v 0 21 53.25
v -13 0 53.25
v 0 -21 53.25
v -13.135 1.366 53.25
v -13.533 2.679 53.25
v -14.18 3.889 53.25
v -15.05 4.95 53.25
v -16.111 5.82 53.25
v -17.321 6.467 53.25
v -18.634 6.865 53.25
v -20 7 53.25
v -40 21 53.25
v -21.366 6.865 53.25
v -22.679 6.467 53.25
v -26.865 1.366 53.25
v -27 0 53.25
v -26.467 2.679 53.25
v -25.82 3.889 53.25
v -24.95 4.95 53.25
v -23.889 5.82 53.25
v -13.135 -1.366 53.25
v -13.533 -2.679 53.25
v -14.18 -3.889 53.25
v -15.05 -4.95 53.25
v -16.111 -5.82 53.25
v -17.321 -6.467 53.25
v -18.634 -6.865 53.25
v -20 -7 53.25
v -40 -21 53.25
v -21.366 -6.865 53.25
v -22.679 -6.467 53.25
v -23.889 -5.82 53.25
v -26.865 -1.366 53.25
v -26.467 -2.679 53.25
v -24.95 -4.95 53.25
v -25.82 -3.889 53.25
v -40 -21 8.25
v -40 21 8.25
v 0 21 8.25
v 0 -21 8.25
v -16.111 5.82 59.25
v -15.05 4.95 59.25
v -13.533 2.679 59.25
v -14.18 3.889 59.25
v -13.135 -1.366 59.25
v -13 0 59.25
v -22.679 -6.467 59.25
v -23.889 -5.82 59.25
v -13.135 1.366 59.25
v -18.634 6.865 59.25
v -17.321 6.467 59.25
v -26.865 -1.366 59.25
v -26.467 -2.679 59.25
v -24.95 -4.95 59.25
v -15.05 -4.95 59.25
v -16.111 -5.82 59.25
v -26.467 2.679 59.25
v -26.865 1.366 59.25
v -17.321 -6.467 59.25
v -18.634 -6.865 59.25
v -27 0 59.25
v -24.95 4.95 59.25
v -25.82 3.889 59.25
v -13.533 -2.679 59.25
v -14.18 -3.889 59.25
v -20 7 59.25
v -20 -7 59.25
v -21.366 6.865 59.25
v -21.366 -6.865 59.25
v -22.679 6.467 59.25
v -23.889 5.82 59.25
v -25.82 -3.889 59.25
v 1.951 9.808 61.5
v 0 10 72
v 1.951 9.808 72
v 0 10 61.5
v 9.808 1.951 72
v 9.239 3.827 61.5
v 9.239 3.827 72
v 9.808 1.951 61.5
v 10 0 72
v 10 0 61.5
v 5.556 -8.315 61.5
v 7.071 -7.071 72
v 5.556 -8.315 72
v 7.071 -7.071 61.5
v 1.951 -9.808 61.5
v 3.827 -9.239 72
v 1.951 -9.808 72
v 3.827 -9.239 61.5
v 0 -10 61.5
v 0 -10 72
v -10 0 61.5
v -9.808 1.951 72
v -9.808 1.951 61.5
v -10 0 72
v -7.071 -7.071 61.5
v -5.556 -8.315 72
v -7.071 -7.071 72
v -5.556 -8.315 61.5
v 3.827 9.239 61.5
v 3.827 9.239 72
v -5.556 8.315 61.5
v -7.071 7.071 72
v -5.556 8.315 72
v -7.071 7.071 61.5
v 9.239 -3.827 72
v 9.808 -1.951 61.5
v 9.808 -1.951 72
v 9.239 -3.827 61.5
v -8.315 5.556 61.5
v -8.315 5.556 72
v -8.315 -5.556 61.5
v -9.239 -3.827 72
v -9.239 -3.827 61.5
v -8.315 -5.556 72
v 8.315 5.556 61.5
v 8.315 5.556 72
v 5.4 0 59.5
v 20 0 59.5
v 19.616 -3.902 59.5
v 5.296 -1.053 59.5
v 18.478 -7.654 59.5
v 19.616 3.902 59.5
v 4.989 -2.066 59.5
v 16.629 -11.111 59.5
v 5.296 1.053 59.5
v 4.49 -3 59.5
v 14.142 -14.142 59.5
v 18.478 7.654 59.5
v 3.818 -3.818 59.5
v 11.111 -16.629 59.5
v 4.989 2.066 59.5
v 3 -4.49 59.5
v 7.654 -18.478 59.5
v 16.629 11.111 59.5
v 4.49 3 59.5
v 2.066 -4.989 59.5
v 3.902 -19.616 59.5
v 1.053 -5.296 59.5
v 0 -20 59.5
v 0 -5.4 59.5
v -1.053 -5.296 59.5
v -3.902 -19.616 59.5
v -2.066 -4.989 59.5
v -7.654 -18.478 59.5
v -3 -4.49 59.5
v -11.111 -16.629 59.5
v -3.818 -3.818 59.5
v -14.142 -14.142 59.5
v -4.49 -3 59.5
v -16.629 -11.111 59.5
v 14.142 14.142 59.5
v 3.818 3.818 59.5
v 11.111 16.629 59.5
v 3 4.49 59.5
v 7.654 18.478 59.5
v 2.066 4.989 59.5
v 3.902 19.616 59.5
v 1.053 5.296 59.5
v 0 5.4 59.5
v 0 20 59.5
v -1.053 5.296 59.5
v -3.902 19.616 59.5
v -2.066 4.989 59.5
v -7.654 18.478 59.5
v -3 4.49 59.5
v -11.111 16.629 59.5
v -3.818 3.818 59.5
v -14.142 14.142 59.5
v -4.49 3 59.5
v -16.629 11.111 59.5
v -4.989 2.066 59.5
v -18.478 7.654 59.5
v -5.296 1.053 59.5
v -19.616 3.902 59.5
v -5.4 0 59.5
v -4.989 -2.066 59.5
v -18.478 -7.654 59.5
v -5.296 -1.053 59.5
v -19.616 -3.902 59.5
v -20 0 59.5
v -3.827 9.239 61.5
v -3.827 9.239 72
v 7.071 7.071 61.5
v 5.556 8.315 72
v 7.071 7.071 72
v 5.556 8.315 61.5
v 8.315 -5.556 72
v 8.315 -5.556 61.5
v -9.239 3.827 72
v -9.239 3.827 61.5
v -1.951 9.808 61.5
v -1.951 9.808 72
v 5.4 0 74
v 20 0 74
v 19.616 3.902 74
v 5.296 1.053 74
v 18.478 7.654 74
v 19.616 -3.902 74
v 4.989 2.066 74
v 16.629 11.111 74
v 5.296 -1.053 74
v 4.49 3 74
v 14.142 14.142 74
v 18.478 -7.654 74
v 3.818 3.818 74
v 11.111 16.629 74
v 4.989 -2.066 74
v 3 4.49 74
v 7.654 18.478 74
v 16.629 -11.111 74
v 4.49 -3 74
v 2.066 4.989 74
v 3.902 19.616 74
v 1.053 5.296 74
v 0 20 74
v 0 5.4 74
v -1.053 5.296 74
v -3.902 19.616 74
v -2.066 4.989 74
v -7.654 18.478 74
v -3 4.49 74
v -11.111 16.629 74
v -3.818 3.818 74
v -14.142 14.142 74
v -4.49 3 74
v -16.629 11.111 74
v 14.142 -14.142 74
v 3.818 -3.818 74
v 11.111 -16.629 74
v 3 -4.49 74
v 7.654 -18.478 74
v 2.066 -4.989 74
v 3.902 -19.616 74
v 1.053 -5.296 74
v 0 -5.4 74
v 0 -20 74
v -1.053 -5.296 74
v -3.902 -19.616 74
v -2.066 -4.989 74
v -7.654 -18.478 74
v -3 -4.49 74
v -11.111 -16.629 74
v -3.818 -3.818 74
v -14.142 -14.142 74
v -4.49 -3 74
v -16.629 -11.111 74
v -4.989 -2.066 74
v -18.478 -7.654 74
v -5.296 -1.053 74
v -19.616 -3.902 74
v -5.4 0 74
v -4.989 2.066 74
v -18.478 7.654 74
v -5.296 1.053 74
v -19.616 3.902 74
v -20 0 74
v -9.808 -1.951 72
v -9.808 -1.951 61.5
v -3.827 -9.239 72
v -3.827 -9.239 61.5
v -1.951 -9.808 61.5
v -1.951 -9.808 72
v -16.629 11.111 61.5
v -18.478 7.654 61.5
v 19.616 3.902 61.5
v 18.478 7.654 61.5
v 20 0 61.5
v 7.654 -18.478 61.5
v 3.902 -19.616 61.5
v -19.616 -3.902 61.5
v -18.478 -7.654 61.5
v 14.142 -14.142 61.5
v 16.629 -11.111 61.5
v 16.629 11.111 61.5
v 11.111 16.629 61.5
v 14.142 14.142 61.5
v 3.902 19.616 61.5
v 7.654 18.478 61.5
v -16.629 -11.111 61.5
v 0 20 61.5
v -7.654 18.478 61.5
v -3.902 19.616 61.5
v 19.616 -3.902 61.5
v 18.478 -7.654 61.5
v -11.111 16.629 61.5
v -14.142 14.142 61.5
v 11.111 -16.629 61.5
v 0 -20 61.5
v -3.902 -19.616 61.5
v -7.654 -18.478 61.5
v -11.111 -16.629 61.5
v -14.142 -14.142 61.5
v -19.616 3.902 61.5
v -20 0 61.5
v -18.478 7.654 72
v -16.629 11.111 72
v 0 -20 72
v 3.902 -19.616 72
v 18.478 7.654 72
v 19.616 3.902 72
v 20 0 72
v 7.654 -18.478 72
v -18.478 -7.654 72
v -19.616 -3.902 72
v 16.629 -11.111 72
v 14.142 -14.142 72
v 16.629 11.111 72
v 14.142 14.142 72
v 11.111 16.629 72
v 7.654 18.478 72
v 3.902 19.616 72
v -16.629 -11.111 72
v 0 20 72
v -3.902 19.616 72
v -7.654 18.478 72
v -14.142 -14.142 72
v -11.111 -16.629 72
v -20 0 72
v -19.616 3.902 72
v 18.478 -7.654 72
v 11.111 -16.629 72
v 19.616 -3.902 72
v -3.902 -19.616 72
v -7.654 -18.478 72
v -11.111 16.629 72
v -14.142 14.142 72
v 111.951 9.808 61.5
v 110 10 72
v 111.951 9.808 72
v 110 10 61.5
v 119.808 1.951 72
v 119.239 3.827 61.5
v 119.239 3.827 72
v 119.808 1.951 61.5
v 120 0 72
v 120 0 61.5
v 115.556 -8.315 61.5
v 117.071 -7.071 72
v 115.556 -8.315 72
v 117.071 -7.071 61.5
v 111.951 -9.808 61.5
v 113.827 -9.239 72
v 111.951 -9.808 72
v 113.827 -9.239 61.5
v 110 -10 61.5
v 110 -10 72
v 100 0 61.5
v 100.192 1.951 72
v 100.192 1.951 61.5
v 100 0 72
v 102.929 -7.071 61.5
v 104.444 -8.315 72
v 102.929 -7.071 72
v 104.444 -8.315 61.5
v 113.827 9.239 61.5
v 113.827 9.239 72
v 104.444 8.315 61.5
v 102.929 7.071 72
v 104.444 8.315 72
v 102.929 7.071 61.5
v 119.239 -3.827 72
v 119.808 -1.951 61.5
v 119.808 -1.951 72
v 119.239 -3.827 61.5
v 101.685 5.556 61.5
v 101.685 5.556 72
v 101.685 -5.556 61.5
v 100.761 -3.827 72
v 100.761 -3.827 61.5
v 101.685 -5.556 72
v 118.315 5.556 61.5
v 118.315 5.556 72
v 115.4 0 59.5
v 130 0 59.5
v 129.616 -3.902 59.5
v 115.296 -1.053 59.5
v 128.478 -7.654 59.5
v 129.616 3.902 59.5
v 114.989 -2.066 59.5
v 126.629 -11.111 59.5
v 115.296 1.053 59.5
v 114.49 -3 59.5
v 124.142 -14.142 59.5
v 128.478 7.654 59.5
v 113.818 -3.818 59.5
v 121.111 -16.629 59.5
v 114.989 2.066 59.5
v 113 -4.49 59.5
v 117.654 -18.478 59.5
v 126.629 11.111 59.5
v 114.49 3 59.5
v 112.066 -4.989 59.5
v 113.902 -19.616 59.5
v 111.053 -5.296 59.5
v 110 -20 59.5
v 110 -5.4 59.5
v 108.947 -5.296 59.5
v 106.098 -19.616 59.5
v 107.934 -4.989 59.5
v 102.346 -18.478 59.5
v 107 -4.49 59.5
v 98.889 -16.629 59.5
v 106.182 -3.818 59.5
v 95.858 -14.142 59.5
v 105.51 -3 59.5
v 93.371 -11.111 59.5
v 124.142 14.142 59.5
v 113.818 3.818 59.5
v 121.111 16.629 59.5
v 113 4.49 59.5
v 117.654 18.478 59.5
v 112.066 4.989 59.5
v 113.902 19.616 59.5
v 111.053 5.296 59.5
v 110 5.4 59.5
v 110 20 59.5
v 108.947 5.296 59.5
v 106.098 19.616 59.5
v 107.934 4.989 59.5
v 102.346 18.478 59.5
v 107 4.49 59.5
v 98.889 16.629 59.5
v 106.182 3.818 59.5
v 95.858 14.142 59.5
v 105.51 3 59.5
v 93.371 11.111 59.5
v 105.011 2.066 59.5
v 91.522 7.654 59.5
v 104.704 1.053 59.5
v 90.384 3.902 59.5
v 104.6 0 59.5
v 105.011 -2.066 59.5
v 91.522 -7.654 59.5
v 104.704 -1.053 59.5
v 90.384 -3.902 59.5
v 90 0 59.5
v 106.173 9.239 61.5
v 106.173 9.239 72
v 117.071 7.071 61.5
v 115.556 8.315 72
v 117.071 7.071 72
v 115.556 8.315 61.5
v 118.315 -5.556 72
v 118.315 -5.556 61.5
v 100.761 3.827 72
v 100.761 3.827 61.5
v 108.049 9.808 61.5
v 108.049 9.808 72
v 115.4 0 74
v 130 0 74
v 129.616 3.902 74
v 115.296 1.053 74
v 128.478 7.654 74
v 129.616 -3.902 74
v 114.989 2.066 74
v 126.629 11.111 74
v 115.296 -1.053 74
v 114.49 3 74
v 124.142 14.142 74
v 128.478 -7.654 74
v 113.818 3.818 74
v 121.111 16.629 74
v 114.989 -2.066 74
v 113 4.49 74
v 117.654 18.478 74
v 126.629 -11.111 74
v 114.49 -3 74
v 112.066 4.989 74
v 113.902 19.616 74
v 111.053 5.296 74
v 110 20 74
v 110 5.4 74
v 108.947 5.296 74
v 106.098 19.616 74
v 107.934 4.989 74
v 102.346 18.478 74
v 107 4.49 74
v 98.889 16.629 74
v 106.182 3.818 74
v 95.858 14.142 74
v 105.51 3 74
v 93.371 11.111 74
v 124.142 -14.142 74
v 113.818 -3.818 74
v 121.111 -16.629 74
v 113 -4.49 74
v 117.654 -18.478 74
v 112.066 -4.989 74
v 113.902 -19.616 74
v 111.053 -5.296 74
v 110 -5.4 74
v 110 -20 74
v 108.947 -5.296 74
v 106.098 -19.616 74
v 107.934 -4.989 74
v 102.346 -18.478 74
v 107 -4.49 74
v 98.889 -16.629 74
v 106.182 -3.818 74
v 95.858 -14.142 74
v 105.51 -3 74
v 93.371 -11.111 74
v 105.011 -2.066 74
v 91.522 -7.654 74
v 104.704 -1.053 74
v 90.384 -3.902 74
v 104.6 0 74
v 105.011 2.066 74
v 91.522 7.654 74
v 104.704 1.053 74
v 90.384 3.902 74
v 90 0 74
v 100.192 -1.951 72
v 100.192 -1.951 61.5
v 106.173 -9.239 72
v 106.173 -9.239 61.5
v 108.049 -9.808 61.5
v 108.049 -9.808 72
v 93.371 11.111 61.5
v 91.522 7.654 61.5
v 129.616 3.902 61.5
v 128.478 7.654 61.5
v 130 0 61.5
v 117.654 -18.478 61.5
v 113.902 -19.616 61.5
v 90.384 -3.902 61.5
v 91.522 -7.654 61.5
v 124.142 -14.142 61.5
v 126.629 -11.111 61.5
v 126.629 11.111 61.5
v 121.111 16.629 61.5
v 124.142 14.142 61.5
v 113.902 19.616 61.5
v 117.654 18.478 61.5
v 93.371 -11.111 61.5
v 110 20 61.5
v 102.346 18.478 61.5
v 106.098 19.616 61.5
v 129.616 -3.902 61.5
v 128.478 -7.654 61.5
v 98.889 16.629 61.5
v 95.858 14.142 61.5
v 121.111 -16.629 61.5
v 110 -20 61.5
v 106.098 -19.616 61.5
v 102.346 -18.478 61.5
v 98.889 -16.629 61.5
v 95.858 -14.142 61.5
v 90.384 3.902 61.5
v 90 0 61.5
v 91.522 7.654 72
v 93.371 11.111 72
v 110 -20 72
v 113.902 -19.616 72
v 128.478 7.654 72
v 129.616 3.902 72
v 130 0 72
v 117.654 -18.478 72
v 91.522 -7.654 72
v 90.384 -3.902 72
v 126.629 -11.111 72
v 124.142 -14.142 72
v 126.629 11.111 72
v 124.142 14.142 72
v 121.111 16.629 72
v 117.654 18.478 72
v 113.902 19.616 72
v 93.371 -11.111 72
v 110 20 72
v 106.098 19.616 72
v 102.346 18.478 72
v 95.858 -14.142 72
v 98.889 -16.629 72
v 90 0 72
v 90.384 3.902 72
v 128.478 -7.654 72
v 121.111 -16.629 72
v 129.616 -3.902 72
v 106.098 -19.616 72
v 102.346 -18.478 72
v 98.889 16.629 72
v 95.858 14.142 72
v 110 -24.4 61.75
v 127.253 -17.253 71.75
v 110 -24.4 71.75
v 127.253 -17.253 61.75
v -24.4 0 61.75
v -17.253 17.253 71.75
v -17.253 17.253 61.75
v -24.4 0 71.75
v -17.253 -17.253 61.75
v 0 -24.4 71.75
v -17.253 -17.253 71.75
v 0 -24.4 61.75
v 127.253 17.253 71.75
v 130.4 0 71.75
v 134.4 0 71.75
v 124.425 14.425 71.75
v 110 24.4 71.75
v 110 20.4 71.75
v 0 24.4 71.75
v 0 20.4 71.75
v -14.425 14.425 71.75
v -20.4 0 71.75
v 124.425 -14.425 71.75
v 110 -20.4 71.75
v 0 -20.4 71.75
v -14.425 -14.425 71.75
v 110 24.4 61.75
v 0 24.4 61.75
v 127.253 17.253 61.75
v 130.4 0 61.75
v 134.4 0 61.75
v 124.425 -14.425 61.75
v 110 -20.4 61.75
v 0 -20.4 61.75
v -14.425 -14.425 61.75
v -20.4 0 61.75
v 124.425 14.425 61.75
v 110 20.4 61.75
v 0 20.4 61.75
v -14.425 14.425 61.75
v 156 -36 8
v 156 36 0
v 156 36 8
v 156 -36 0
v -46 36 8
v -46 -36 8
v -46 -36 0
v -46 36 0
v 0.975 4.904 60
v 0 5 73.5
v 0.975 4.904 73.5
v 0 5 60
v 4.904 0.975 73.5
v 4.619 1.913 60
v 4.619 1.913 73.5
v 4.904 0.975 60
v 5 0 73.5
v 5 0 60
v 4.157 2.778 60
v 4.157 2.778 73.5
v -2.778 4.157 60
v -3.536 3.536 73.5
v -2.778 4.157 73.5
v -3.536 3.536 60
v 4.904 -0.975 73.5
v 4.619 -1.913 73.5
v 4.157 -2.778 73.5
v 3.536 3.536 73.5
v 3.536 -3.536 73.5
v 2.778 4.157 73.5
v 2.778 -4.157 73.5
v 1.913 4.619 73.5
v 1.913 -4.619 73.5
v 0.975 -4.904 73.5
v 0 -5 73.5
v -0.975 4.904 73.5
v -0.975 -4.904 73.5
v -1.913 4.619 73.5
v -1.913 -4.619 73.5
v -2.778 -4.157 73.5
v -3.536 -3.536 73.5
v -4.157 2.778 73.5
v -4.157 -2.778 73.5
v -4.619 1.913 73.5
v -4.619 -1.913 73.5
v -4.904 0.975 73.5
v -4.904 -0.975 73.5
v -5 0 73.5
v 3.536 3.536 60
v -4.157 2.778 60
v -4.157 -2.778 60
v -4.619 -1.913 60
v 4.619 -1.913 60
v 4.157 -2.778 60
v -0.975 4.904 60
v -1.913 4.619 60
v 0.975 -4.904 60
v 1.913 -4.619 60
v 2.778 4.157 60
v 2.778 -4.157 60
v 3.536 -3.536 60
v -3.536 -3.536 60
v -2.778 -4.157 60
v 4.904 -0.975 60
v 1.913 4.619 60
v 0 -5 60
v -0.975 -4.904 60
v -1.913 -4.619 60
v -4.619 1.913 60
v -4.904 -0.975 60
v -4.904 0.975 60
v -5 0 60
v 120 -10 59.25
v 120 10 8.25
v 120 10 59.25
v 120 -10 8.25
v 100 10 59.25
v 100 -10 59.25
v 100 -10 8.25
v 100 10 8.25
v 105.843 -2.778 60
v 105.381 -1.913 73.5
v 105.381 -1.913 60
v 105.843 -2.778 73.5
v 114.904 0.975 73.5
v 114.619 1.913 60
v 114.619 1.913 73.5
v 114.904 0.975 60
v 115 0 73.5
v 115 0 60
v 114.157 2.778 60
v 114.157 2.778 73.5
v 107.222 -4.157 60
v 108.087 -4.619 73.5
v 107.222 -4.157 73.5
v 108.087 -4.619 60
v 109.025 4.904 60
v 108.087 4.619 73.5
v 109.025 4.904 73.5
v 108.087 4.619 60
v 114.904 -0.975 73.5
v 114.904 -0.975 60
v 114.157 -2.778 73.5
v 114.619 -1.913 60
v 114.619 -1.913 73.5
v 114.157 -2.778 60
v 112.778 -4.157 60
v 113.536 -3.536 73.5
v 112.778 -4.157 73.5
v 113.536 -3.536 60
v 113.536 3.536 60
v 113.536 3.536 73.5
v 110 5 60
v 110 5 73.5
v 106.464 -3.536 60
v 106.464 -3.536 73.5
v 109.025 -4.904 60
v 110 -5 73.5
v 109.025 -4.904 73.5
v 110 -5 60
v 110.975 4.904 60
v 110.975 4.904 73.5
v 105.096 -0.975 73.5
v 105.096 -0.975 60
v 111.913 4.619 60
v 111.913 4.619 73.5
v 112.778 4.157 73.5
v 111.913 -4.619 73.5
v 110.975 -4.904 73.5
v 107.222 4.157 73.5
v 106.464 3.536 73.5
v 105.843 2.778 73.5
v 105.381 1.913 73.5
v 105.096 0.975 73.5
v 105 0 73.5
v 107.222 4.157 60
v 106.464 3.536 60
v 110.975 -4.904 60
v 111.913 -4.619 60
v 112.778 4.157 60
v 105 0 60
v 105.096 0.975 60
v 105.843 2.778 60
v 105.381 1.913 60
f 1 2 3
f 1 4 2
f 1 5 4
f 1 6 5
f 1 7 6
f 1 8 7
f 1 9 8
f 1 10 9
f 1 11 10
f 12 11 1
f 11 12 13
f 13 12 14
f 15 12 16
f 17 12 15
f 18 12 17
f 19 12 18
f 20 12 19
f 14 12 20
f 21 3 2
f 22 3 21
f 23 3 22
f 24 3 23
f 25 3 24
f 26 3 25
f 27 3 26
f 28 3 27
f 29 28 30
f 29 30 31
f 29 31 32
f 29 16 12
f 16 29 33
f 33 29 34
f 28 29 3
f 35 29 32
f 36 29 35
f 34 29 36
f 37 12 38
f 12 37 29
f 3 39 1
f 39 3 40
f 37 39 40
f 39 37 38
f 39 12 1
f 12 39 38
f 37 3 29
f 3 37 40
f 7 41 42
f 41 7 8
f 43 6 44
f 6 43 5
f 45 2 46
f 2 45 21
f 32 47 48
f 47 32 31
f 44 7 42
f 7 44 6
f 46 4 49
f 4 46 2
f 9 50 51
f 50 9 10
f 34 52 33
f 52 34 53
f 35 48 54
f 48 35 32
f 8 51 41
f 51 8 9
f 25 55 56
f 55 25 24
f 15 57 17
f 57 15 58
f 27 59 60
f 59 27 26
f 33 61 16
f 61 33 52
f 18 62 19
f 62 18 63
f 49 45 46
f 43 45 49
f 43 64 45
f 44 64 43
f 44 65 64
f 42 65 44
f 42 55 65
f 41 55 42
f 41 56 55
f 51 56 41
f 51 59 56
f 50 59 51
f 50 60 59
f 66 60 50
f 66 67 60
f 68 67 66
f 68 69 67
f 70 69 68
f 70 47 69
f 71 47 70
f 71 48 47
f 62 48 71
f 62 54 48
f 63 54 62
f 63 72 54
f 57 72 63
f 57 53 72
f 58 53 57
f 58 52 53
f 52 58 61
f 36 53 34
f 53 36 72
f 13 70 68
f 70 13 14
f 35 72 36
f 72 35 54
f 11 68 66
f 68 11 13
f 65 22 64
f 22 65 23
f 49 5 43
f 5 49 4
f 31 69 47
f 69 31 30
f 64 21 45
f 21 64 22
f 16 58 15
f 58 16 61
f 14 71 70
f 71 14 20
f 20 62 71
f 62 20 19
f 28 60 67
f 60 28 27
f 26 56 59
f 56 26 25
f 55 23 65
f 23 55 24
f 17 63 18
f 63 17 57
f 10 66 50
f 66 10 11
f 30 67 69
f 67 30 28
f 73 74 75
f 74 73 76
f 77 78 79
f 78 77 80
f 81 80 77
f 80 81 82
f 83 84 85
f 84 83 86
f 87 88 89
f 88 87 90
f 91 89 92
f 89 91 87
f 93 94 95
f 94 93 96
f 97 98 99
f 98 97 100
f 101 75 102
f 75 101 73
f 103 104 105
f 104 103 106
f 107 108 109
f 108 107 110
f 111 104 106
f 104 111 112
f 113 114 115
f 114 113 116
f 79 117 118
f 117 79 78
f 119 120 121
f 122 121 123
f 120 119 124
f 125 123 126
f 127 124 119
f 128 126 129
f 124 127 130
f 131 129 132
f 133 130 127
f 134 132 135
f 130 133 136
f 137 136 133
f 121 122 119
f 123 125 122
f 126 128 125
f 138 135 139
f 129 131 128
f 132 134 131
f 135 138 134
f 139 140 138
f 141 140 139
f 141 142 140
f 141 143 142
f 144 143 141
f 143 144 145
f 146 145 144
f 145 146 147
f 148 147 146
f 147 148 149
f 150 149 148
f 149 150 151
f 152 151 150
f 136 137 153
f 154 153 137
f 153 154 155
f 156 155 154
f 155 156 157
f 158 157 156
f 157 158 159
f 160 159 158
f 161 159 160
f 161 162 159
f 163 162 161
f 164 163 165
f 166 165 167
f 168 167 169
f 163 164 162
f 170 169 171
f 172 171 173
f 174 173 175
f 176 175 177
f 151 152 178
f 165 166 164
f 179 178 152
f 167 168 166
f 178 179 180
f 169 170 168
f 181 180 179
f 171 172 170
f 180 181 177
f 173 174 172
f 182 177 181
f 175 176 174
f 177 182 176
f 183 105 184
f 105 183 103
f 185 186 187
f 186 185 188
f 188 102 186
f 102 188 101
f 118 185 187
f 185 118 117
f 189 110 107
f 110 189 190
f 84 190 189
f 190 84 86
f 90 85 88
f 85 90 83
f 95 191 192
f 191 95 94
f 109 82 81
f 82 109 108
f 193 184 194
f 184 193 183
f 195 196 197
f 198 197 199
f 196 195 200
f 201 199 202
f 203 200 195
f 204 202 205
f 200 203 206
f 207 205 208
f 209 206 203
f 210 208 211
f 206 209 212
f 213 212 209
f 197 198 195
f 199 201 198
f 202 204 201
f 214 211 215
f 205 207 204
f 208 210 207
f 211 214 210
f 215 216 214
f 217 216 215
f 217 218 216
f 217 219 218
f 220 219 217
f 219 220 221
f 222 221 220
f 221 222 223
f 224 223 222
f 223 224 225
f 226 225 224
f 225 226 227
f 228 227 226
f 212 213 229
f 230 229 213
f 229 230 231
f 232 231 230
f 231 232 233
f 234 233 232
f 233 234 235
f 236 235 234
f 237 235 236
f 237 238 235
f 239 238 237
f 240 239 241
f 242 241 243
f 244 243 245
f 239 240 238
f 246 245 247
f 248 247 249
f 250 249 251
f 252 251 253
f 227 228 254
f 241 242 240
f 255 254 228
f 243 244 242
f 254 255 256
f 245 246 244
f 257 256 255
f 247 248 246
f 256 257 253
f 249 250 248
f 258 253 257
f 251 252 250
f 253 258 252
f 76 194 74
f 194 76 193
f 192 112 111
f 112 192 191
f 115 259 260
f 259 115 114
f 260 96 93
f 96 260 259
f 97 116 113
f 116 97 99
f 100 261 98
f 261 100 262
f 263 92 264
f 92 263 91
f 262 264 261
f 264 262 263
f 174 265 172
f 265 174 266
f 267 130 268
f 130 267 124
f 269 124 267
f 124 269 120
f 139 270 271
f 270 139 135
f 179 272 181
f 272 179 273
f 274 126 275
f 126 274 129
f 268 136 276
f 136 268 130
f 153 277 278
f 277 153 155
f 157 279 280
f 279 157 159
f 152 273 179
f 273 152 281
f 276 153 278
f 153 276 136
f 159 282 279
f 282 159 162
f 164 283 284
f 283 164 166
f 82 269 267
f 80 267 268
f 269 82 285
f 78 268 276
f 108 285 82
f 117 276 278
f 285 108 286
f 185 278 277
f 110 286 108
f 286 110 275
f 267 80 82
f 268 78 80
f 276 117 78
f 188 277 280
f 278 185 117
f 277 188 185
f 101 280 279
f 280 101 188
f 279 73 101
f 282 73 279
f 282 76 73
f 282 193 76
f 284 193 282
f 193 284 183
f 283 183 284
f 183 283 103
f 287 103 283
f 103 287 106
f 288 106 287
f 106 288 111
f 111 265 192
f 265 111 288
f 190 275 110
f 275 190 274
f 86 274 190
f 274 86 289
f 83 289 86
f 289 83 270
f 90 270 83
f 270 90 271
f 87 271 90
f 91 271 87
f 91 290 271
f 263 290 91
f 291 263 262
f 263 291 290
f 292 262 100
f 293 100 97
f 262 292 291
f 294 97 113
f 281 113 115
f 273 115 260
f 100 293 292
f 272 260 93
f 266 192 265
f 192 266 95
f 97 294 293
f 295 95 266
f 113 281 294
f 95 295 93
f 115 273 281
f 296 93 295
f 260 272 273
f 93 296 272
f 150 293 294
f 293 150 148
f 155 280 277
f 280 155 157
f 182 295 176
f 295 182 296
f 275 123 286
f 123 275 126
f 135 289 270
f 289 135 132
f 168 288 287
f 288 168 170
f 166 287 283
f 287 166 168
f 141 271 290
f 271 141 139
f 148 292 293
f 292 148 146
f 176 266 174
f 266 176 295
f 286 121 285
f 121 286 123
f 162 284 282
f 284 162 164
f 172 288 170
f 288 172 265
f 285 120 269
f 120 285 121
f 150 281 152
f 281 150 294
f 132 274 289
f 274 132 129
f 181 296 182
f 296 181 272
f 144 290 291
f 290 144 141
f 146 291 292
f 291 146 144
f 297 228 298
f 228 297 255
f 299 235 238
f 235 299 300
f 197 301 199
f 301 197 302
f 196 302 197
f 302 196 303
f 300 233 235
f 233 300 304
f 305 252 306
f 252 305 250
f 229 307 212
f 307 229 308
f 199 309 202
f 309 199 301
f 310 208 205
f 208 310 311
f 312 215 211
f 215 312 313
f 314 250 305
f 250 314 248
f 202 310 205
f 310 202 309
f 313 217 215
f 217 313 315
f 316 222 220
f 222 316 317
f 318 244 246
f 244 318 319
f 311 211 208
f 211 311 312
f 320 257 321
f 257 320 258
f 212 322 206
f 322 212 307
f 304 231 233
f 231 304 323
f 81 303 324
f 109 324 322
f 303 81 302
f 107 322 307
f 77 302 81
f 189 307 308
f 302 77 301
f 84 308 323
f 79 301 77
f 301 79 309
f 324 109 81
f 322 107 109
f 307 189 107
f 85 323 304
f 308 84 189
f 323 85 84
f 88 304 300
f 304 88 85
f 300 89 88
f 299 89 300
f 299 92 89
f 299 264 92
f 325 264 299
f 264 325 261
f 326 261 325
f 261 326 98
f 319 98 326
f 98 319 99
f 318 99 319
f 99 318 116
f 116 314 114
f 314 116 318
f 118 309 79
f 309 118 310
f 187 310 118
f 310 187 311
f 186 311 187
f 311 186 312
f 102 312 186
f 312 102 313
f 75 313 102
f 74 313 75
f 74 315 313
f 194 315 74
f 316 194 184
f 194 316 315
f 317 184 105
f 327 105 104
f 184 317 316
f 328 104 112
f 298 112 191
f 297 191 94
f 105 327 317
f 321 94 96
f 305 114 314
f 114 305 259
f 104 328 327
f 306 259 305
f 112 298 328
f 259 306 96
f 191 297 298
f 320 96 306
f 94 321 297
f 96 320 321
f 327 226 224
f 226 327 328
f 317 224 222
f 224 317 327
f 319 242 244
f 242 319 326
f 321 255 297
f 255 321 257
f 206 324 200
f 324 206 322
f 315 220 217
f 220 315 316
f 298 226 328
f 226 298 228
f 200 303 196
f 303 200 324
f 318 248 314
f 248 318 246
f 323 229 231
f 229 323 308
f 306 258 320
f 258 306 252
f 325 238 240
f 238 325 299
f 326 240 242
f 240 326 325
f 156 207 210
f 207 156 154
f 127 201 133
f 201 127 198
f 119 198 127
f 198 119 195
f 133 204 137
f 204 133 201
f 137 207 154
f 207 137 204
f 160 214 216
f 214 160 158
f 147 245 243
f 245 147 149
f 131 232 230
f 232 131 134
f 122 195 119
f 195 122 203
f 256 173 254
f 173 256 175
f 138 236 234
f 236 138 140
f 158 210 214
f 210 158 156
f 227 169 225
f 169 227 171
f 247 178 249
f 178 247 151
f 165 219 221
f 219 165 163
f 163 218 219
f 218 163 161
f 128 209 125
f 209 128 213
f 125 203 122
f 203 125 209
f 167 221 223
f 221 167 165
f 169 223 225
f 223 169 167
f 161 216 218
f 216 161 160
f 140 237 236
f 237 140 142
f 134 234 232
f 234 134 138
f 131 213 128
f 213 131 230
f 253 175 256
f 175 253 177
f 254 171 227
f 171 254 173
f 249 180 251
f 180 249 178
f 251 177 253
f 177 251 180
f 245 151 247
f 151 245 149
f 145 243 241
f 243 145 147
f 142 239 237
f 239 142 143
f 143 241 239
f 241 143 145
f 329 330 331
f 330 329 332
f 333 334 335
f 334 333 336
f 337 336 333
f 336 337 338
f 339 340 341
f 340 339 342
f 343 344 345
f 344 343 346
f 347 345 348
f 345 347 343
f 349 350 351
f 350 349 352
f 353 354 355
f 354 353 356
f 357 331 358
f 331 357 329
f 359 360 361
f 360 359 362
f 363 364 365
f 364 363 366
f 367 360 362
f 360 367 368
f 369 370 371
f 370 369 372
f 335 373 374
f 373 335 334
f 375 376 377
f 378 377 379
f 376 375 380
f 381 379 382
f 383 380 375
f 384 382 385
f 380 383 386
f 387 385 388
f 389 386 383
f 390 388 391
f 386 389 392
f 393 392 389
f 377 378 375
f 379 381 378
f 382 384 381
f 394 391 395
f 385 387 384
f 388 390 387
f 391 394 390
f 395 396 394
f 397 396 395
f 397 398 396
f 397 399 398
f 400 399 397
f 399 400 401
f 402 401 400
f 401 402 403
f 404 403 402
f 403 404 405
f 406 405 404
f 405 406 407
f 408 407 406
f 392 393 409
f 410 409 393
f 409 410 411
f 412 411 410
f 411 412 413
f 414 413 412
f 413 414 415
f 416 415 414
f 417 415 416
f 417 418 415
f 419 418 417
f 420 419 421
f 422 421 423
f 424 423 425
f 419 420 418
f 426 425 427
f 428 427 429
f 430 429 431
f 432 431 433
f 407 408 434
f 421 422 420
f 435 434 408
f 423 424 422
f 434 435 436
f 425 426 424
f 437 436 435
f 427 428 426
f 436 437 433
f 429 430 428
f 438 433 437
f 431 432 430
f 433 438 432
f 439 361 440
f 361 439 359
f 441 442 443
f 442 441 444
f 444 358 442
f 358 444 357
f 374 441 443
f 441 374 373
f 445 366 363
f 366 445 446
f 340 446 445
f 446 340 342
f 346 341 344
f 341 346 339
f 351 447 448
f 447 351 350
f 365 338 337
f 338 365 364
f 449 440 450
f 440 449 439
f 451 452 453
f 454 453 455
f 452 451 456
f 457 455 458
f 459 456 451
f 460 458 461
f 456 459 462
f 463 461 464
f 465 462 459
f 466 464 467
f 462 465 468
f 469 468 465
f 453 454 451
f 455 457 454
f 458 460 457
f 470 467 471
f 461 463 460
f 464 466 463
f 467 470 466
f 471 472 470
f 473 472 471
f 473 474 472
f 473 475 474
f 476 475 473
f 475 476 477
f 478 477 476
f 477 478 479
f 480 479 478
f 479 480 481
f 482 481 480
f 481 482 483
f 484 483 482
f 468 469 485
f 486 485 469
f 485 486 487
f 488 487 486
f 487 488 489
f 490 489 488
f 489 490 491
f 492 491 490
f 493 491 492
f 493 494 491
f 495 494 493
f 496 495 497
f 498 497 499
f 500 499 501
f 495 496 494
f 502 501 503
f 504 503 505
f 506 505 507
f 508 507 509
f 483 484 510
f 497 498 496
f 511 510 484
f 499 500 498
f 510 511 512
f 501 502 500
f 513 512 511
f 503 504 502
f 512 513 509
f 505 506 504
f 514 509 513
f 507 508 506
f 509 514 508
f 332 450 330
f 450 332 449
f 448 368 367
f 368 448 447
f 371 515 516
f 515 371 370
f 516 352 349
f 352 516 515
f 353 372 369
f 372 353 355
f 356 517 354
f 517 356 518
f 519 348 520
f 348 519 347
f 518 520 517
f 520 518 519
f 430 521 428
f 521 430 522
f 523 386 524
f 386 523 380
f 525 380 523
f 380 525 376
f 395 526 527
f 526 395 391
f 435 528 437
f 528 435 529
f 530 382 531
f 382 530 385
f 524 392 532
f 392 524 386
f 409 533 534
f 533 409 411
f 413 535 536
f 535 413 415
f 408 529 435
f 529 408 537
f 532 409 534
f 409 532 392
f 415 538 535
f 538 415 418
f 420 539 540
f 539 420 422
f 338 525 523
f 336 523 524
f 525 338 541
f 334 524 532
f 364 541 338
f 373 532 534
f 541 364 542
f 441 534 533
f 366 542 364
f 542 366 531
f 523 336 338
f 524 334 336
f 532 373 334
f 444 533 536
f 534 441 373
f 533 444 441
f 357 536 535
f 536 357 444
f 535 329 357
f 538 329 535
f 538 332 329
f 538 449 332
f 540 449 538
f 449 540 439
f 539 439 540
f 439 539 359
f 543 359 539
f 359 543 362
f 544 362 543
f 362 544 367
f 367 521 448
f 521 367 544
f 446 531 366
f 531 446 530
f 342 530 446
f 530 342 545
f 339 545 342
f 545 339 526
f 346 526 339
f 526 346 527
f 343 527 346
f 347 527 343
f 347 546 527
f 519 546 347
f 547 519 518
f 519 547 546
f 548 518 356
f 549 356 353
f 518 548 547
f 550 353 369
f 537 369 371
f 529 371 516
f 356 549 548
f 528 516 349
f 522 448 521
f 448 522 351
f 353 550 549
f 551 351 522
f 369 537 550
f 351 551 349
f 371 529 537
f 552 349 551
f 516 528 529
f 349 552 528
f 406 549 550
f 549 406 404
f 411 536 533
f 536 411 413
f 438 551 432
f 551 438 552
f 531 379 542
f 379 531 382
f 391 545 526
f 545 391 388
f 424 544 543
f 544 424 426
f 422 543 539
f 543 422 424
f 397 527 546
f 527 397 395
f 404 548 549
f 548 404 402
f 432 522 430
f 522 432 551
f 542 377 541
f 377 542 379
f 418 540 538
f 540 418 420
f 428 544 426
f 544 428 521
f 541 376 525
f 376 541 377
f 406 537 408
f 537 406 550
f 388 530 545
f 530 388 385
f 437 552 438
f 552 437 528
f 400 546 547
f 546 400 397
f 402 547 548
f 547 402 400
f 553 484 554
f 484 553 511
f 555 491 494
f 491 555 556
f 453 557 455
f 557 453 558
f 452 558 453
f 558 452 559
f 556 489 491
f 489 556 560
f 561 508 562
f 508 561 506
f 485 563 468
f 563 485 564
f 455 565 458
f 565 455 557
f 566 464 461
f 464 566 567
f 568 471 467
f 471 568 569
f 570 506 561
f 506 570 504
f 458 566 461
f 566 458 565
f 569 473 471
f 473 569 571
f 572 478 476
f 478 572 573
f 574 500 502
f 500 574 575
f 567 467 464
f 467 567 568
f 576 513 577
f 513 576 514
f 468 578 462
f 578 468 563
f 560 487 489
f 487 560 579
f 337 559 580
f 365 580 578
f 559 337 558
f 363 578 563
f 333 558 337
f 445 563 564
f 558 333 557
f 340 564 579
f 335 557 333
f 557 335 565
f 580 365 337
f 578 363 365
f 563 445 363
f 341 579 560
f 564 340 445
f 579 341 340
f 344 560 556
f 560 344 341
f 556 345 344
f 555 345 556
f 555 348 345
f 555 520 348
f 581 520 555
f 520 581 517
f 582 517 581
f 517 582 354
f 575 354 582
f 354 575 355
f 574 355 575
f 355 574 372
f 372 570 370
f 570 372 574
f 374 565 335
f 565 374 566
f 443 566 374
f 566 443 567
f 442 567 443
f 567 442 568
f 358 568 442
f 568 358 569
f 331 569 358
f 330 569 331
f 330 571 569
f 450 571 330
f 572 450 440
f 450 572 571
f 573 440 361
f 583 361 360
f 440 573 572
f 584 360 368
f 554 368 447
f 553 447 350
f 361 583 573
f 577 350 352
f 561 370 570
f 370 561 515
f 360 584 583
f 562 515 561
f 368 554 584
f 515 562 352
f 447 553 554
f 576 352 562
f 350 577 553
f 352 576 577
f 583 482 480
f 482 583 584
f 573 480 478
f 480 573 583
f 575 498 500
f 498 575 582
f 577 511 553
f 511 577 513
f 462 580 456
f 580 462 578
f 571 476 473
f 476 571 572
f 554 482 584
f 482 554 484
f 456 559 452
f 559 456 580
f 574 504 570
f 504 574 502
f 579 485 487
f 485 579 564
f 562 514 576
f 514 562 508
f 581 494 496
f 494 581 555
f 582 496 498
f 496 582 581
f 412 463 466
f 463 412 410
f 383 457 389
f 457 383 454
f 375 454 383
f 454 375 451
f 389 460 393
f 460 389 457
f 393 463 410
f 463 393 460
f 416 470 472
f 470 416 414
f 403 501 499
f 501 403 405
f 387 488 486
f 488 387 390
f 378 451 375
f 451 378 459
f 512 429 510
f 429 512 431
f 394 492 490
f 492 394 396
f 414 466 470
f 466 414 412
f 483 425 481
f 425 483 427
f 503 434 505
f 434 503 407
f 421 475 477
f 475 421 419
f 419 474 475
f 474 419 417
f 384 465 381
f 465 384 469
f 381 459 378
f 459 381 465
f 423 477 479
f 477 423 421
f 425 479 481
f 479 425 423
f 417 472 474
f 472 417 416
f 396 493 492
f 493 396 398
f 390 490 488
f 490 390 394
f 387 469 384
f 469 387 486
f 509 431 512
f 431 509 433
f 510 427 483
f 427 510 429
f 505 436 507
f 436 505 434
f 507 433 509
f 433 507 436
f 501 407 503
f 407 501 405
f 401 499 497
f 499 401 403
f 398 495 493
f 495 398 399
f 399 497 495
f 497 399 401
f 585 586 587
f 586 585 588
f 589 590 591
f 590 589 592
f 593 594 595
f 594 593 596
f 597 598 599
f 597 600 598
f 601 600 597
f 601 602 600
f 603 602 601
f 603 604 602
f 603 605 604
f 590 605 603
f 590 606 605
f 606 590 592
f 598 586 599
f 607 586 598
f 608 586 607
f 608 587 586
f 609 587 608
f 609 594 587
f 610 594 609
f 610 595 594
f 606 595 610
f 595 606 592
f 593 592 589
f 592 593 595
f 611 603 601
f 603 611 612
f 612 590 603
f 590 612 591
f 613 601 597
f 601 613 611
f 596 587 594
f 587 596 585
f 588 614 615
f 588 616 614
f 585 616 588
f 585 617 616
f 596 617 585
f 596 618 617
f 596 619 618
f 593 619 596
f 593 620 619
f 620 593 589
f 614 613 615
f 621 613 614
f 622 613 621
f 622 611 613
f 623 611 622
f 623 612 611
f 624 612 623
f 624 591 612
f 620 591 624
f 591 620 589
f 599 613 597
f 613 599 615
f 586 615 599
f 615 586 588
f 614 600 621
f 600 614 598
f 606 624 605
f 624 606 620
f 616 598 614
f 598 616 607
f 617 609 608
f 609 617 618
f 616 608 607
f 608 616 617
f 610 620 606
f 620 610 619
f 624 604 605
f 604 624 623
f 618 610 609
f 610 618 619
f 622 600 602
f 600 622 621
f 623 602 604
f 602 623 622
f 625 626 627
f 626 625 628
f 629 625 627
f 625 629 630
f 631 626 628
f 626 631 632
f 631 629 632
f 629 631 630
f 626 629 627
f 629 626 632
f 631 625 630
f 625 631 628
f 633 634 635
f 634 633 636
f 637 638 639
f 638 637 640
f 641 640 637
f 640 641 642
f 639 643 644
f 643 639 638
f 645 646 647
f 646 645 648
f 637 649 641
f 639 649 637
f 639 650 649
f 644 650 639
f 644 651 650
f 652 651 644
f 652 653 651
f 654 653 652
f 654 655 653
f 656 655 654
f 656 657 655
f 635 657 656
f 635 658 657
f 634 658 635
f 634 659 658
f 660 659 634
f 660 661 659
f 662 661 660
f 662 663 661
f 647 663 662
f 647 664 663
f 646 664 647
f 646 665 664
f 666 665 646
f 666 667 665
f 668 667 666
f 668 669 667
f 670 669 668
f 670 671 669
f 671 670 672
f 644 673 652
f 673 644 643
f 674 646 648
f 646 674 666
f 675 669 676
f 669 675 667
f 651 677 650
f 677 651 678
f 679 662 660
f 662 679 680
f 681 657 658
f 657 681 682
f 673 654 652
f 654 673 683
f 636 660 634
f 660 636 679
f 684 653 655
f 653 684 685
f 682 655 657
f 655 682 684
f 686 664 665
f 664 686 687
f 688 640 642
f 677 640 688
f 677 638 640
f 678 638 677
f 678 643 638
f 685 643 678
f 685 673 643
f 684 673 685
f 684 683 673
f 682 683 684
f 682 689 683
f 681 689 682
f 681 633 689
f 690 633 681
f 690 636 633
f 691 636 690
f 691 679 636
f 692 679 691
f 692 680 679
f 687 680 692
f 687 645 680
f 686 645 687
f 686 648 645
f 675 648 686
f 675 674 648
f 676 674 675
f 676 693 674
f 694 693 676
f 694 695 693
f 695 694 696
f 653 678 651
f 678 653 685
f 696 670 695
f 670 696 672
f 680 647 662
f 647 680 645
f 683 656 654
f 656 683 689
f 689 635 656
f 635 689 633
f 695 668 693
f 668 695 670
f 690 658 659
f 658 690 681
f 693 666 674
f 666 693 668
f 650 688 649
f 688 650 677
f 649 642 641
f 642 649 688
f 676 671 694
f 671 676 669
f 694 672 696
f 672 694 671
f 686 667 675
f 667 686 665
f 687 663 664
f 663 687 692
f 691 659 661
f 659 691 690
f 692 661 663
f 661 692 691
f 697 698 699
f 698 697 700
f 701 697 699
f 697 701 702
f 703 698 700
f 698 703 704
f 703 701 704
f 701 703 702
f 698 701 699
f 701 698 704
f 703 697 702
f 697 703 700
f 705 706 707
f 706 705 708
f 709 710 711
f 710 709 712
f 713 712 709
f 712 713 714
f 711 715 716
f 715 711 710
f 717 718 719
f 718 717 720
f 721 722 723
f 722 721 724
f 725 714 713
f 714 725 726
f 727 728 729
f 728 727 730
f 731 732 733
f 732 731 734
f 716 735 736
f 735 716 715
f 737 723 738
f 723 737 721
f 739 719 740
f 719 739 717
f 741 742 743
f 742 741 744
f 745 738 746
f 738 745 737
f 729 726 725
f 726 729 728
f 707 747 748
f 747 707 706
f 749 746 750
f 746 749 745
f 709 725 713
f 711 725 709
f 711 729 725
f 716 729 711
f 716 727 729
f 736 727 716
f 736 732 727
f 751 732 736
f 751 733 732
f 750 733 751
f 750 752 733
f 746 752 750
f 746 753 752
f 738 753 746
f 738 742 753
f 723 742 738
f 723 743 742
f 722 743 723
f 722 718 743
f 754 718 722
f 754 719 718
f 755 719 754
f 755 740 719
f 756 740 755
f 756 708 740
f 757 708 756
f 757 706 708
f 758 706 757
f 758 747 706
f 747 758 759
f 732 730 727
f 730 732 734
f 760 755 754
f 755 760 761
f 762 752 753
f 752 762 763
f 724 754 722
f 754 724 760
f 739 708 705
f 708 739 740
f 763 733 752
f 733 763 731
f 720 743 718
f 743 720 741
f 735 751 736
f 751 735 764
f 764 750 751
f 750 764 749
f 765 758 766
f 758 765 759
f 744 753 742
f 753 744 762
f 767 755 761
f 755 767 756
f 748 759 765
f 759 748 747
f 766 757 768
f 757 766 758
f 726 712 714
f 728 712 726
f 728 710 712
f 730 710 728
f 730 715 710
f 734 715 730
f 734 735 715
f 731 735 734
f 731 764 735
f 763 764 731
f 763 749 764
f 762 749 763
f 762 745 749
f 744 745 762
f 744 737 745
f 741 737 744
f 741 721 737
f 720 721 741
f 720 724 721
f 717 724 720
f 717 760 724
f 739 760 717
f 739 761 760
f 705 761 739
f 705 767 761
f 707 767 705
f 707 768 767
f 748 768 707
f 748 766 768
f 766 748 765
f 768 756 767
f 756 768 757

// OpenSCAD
$fn = 32;

// ------------------------------------------------------------------------
// Motor belt drive: span 110 mm, pulleys d40, belt 10 mm wide
// Every part is its own module, assembly() places every instance.
// ------------------------------------------------------------------------

// --- part 1 ---
module base_plate() {
  difference() {
    translate([-101, -36, 0]) cube([202, 72, 8]);
  }
}

// --- part 2 ---
module motor() {
  union() {
    translate([-22.5, -21, 0]) cube([45, 42, 40]);
    translate([25.5, 0, 20]) rotate([0, 90, 0]) cylinder(h = 6, d = 14, center = true);
  }
}

// --- part 3 ---
module drive_shaft() {
  translate([0, 0, -6.75]) cylinder(h = 13.5, d = 10);
}

// --- part 4 ---
module pulley_drive() {
  difference() {
    union() {
      cylinder(h = 14.5, d = 20);
      cylinder(h = 2, d = 40);
      translate([0, 0, 12.5]) cylinder(h = 2, d = 40);
    }
    translate([0, 0, -1]) cylinder(h = 16.5, d = 10.8);
  }
}

// --- part 5 ---
module idler_post() {
  translate([-10, -10, 0]) cube([20, 20, 51]);
}

// --- part 6 ---
module driven_shaft() {
  translate([0, 0, -6.75]) cylinder(h = 13.5, d = 10);
}

// --- part 7 ---
module pulley_driven() {
  difference() {
    union() {
      cylinder(h = 14.5, d = 20);
      cylinder(h = 2, d = 40);
      translate([0, 0, 12.5]) cylinder(h = 2, d = 40);
    }
    translate([0, 0, -1]) cylinder(h = 16.5, d = 10.8);
  }
}

// --- part 8 ---
module drive_belt() {
  difference() {
    linear_extrude(height = 10) polygon(points = concat([for (a = [90 : 45 : 270]) [24.4 * cos(a), 24.4 * sin(a)]], [for (a = [270 : 45 : 450]) [110 + 24.4 * cos(a), 24.4 * sin(a)]]));
    translate([0, 0, -1]) linear_extrude(height = 12) polygon(points = concat([for (a = [90 : 45 : 270]) [20.4 * cos(a), 20.4 * sin(a)]], [for (a = [270 : 45 : 450]) [110 + 20.4 * cos(a), 20.4 * sin(a)]]));
  }
}

// --- assembly ---
module assembly() {
  color([0.80, 0.24, 0.20]) translate([55, 0, 0]) rotate([0, 0, 0]) base_plate();
  color([0.20, 0.45, 0.75]) translate([0, 0, 30.75]) rotate([0, 270, 0]) motor();
  color([0.25, 0.62, 0.32]) translate([0, 0, 66.75]) rotate([0, 0, 0]) drive_shaft();
  color([0.92, 0.70, 0.18]) translate([0, 0, 59.5]) rotate([0, 0, 0]) pulley_drive();
  color([0.58, 0.35, 0.70]) translate([110, 0, 8.25]) rotate([0, 0, 0]) idler_post();
  color([0.16, 0.66, 0.66]) translate([110, 0, 66.75]) rotate([0, 0, 0]) driven_shaft();
  color([0.85, 0.48, 0.18]) translate([110, 0, 59.5]) rotate([0, 0, 0]) pulley_driven();
  color([0.55, 0.60, 0.65]) translate([0, 0, 61.75]) rotate([0, 0, 0]) drive_belt();
}

assembly();
